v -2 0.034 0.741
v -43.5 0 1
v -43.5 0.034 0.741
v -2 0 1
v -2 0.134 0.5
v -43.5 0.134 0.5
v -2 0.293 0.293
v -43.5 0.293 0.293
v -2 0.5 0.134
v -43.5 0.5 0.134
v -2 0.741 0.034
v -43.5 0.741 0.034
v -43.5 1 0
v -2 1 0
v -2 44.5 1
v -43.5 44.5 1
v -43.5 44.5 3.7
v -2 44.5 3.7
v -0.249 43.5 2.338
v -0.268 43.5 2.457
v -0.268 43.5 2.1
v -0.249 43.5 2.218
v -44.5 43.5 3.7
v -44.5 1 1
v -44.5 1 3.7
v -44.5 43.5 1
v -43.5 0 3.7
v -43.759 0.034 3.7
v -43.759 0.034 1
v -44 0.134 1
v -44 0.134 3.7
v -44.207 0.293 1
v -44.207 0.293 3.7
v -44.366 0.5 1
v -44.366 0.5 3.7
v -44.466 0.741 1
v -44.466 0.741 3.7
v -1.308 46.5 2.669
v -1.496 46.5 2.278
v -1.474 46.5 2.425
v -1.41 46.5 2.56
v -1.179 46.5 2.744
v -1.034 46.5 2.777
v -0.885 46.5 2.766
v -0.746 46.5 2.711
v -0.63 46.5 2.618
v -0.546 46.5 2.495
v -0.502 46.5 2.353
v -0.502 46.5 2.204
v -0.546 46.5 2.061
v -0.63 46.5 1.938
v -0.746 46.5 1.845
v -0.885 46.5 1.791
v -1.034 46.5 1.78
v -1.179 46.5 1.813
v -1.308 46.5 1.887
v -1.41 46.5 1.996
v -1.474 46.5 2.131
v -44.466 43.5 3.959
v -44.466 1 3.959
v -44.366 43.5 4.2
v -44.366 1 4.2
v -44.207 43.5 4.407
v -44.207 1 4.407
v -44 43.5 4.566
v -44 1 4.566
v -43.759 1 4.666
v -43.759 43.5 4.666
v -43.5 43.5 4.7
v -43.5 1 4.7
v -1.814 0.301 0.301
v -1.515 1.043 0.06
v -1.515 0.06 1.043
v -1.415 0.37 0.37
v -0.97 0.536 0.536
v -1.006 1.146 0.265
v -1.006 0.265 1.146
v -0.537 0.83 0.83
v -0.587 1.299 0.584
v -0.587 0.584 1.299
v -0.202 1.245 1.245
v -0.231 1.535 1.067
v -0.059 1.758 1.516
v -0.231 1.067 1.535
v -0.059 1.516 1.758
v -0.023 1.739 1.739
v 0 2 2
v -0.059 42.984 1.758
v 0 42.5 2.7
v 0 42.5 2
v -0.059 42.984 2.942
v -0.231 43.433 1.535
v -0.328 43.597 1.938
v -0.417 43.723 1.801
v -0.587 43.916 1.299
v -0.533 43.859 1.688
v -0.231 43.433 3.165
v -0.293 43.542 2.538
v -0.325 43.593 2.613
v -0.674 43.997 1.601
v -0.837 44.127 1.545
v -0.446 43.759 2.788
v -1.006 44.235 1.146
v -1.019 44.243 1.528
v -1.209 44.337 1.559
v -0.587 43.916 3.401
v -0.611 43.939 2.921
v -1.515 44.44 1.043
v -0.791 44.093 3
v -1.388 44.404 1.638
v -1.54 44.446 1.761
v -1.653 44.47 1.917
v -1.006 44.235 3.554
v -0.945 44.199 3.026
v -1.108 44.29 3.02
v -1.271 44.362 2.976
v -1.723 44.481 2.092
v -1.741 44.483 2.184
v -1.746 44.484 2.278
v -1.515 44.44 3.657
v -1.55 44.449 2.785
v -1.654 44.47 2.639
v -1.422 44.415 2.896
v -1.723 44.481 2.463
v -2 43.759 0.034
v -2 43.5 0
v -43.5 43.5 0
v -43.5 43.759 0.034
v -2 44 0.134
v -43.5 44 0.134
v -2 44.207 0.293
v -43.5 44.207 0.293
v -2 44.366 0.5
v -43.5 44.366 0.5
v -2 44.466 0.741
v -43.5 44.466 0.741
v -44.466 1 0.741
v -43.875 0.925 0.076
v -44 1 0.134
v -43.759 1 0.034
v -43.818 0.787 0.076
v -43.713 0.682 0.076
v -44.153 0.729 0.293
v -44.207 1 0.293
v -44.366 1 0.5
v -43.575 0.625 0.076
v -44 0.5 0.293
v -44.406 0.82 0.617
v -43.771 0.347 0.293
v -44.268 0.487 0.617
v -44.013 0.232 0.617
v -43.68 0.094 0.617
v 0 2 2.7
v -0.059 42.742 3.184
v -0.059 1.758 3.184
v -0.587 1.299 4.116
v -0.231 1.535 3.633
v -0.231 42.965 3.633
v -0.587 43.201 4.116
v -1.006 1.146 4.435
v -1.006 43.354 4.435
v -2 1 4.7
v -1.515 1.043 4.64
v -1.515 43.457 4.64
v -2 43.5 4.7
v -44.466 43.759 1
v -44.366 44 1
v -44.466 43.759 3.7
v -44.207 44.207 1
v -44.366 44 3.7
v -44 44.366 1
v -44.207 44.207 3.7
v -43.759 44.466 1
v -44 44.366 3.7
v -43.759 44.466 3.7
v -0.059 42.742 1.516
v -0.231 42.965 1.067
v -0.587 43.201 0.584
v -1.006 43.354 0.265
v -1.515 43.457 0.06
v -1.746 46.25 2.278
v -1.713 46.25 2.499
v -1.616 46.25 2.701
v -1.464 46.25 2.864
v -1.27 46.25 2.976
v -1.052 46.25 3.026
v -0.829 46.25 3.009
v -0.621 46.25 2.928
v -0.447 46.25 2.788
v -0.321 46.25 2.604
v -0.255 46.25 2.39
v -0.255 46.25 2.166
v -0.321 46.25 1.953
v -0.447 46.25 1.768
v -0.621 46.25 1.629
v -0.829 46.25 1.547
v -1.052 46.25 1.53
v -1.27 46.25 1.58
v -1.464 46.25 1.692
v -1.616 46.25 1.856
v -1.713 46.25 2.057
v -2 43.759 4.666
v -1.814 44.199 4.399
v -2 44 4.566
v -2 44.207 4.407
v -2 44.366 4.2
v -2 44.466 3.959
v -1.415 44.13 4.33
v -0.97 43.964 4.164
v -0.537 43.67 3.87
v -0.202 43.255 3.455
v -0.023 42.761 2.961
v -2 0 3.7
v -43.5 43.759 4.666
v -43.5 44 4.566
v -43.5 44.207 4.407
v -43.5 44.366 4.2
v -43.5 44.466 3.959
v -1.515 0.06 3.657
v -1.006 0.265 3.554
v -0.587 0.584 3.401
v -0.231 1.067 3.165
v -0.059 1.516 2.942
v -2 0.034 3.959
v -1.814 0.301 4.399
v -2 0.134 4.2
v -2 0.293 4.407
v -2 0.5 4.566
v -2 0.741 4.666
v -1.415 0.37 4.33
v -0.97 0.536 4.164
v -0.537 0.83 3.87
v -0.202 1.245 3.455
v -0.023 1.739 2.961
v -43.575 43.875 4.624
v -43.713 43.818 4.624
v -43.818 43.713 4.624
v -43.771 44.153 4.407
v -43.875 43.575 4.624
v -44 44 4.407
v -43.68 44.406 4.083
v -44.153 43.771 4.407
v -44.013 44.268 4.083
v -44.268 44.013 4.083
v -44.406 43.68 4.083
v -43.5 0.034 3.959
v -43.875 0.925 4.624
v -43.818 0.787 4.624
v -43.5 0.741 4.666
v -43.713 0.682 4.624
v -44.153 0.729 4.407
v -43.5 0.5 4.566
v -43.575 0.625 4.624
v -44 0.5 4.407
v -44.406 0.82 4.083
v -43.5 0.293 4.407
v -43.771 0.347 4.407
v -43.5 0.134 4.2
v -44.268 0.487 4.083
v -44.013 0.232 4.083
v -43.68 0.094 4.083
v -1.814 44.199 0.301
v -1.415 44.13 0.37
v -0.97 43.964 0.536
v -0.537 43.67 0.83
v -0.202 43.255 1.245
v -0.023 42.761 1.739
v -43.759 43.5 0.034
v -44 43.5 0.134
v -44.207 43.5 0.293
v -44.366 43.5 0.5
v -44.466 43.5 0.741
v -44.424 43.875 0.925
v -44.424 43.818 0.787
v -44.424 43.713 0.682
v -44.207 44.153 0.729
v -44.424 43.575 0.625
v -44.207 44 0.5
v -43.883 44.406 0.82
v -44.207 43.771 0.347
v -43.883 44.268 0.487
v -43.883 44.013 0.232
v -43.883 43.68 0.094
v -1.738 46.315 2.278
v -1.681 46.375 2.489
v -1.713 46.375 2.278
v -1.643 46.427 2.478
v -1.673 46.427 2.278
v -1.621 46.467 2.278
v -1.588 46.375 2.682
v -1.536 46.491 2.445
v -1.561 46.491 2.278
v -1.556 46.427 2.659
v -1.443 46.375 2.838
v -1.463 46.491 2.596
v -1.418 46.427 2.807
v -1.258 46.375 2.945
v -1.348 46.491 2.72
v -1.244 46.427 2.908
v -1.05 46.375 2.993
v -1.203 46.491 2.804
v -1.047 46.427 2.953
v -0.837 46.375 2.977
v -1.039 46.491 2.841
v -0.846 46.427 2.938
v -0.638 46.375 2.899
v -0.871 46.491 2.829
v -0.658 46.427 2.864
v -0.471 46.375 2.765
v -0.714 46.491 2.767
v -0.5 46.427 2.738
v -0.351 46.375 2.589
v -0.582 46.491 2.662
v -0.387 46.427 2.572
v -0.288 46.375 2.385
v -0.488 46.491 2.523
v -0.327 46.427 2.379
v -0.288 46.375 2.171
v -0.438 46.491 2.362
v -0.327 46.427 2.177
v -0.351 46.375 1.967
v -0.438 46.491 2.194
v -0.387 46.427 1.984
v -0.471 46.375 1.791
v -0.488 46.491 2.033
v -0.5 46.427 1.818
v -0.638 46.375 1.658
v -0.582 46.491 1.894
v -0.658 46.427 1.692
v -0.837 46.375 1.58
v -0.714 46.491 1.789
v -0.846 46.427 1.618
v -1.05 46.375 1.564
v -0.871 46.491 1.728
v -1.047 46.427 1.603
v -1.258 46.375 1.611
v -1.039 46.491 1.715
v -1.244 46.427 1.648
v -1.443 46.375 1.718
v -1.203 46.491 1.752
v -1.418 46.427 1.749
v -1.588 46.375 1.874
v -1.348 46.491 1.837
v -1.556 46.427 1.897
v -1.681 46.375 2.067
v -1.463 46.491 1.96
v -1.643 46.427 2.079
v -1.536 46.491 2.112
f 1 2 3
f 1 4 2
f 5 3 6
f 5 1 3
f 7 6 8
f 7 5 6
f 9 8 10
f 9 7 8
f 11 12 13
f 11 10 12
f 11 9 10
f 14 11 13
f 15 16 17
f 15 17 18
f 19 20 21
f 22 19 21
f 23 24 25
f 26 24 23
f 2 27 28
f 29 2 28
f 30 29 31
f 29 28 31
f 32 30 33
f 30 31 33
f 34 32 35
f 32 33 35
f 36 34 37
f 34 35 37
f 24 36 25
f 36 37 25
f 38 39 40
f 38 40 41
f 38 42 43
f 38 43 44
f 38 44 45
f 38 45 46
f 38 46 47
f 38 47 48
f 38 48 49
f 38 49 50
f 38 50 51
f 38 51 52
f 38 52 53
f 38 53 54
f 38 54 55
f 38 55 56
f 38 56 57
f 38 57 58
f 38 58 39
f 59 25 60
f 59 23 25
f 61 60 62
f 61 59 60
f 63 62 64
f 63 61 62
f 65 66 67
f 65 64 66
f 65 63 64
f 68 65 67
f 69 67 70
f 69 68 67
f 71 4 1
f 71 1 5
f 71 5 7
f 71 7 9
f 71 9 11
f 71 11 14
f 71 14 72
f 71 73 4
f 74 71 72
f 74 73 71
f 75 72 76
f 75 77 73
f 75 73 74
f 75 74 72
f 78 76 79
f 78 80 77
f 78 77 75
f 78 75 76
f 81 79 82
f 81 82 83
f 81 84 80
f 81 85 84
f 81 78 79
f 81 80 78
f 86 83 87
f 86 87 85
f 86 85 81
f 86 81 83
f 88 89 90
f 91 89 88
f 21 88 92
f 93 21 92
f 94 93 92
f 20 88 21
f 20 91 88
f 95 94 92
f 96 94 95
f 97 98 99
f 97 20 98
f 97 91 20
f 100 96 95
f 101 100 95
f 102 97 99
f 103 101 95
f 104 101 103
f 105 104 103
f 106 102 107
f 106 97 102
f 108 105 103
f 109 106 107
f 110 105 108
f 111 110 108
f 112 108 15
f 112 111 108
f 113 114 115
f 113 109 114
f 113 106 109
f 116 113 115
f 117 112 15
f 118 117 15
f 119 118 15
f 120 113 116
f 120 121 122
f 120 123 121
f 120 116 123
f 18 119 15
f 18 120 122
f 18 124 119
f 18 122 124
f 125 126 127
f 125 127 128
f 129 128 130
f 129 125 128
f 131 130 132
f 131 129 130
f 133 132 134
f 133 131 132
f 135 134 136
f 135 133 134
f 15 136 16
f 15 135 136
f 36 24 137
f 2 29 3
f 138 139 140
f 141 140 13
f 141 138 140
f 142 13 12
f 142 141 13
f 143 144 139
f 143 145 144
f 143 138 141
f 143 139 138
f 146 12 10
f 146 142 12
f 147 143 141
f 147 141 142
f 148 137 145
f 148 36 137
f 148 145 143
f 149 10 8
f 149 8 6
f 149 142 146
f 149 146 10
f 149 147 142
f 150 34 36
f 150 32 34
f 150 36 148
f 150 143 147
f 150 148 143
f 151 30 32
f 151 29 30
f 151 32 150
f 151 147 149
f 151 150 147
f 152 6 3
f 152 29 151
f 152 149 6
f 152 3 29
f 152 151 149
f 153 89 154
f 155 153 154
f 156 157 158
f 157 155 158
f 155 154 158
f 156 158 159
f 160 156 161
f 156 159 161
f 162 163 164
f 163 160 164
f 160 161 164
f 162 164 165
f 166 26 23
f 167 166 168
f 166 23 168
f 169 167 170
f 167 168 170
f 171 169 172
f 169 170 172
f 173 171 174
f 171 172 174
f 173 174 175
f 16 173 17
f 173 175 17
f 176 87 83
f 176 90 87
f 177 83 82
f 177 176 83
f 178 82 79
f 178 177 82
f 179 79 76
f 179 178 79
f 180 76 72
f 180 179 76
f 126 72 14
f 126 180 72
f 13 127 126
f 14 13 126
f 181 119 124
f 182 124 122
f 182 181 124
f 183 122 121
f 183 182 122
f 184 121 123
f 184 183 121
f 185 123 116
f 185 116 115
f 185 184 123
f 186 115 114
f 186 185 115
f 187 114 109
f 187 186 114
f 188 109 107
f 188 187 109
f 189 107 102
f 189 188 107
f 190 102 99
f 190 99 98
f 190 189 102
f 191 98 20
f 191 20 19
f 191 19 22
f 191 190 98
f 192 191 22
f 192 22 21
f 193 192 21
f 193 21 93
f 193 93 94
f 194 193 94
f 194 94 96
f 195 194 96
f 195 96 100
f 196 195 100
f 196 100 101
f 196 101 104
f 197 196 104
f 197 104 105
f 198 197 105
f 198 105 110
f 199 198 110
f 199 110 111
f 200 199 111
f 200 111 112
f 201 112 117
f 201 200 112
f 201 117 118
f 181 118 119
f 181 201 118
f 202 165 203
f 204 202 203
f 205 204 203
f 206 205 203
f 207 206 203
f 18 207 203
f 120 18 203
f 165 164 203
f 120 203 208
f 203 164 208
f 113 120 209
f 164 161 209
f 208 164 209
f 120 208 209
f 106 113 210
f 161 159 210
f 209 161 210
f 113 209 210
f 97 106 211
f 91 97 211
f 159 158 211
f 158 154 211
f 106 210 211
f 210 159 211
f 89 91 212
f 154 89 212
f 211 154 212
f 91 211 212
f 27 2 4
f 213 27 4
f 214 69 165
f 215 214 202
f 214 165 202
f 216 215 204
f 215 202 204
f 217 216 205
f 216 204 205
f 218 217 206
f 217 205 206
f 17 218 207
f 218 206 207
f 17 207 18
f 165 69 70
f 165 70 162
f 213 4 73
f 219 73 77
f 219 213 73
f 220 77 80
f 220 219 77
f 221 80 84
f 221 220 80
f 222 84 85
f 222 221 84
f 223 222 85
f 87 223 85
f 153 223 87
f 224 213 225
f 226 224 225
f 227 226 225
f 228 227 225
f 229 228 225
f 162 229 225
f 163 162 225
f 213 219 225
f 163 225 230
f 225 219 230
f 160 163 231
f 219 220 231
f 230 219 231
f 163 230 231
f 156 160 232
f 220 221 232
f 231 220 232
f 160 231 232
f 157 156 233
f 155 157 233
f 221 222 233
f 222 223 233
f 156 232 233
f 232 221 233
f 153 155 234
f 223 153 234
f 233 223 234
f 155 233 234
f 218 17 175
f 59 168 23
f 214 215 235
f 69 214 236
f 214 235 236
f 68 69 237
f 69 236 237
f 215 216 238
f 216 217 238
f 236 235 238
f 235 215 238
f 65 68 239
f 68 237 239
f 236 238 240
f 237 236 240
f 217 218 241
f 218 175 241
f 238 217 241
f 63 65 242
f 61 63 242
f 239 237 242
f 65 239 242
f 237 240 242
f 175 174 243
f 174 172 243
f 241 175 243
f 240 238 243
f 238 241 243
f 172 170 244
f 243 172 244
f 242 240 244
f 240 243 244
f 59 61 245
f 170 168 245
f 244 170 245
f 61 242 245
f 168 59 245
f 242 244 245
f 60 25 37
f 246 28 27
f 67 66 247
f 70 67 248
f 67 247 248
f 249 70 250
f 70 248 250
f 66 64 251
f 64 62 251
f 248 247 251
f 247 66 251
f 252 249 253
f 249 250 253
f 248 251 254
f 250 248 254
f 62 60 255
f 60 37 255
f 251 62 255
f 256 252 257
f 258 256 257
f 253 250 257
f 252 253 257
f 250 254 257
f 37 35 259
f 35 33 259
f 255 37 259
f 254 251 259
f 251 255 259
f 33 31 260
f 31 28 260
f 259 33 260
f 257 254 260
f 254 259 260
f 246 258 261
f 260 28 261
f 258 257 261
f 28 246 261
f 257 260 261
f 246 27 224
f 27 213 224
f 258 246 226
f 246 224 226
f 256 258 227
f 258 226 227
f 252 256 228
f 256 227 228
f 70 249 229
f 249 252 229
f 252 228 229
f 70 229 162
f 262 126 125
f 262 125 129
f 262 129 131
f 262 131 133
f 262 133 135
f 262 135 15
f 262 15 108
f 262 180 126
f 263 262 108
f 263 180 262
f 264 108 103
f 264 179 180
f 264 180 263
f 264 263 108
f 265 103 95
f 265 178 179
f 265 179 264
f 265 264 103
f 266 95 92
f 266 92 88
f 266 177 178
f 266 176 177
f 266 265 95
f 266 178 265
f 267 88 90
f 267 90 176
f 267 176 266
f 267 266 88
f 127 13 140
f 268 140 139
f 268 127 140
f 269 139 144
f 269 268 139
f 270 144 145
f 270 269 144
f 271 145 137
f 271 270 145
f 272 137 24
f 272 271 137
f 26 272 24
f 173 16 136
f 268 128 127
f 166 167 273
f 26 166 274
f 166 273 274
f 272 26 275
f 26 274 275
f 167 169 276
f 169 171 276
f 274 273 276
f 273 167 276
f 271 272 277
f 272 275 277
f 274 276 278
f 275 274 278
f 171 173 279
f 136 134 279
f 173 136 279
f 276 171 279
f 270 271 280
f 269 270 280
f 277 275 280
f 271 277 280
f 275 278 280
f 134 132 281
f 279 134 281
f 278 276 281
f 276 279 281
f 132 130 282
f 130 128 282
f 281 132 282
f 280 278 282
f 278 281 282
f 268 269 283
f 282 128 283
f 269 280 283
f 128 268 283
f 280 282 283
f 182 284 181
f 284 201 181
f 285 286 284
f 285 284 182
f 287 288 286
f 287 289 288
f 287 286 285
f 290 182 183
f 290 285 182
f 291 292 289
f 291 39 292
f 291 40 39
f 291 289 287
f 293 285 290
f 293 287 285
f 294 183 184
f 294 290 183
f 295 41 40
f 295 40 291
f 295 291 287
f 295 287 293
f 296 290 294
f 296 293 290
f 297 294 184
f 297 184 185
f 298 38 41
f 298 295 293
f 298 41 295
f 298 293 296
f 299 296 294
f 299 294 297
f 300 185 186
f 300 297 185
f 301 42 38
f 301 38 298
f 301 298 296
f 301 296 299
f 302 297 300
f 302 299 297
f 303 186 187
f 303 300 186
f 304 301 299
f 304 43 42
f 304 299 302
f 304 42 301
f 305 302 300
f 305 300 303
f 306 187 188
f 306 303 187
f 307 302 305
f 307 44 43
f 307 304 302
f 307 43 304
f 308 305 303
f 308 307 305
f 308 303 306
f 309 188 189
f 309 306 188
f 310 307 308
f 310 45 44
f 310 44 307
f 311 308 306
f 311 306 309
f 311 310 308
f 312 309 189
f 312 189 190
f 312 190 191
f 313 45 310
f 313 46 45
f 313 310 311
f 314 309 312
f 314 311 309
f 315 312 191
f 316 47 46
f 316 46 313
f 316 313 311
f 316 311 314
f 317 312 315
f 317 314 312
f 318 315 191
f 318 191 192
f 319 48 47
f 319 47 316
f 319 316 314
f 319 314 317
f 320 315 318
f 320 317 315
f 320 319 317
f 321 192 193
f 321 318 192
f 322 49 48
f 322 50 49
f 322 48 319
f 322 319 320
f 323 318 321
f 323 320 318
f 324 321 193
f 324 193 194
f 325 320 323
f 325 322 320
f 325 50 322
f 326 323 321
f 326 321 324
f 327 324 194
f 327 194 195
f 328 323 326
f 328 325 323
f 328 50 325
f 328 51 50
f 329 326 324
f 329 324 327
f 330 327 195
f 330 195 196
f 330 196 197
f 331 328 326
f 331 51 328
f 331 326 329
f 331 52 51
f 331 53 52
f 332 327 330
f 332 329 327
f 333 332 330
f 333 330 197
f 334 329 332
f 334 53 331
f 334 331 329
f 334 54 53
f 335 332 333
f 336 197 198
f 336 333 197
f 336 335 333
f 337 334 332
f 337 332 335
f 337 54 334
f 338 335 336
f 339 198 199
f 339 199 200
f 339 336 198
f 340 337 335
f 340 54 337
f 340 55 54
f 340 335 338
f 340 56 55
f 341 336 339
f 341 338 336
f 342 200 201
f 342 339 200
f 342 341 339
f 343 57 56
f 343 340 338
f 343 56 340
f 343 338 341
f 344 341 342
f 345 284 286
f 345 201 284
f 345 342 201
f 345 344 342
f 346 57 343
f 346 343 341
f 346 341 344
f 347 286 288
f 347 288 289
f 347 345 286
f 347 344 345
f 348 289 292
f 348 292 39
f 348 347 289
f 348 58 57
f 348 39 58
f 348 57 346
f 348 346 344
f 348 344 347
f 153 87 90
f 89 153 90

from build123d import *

# Parameters (mm, degrees)
SKETCH_W          = 44.5
SKETCH_H          = 44.5
PAD_DEPTH         = 4.7
FILLET_R          = 2
FILLET001_R       = 1
SKETCH001_R       = 0.75
PAD001_DEPTH      = 2
PAD001_DEPTH_BACK = 1
FILLET002_R       = 0.25


with BuildPart() as part:
    # Sketch → Pad (new body)
    with BuildSketch(Plane.XY):
        with Locations((-22.25, 22.25)):
            Rectangle(SKETCH_W, SKETCH_H)
    extrude(amount=PAD_DEPTH)

    # Fillet
    fillet_edges = [part.edges().sort_by_distance(p)[0] for p in [
        (0, 44.5, 2.35),
        (0, 0, 2.35),
        (0, 22.25, 0),
        (0, 22.25, 4.7),
    ]]
    fillet(fillet_edges, radius=FILLET_R)

    # Fillet001
    fillet001_edges = [part.edges().sort_by_distance(p)[0] for p in [
        (-23.25, 44.5, 0),
        (-2, 44.5, 2.35),
        (-44.5, 44.5, 2.35),
        (-23.25, 44.5, 4.7),
        (-44.5, 0, 2.35),
        (-44.5, 22.25, 0),
        (-44.5, 22.25, 4.7),
        (-23.25, 0, 0),
        (-2, 0, 2.35),
        (-23.25, 0, 4.7),
    ]]
    fillet(fillet001_edges, radius=FILLET001_R)

    # Sketch001 (on Face1 of Fillet001) → Pad001 (join, two sides)
    with BuildSketch(Plane(origin=(0, 44.5, 0), x_dir=(-1, 0, 0), z_dir=(0, 1, 0))) as pad001_sk:
        with Locations((0.996389, 2.278105)):
            Circle(SKETCH001_R)
    extrude(amount=PAD001_DEPTH)
    extrude(pad001_sk.sketch, amount=-PAD001_DEPTH_BACK)

    # Fillet002
    fillet002_edges = [part.edges().sort_by_distance(p)[0] for p in [
        (-0.246389, 46.5, 2.278105),
    ]]
    fillet(fillet002_edges, radius=FILLET002_R)


solid = part.part
